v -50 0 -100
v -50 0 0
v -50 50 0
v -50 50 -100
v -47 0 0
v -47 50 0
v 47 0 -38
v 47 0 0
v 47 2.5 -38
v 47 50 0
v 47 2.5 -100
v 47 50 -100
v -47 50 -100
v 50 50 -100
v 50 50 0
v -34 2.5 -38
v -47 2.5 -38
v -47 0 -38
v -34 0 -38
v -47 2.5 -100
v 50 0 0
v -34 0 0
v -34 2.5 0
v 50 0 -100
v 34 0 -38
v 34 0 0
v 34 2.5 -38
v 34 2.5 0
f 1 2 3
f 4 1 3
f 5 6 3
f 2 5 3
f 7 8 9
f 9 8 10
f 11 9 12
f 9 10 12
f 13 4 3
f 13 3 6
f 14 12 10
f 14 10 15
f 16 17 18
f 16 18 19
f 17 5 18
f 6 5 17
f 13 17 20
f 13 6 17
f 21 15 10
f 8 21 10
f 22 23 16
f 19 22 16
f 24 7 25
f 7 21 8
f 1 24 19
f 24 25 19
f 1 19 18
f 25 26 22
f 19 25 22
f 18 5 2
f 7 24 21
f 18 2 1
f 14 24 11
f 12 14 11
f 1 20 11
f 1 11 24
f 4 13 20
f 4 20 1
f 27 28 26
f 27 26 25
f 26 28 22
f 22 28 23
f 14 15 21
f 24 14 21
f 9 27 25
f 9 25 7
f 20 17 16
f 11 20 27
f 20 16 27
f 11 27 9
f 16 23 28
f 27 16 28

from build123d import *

# Parameters (mm, degrees)
SALIENTE_EXTRUIR1_DEPTH = 100
CROQUIS2_W              = 13
CROQUIS2_H              = 38
CORTAR_EXTRUIR2_DEPTH   = 10


with BuildPart() as part:
    # Croquis1 → Saliente-Extruir1 (new body)
    with BuildSketch(Plane.XY):
        Polygon((50, 0), (-50, 0), (-50, 50), (-47, 50), (-47, 2.5), (47, 2.5), (47, 50), (50, 50), align=None)
    extrude(amount=-SALIENTE_EXTRUIR1_DEPTH)

    # Croquis2 → Cortar-Extruir2 (cut)
    with BuildSketch(Plane(origin=(0, 2.5, 0), x_dir=(1, 0, 0), z_dir=(0, 1, 0))):
        with Locations((-40.5, 19)):
            Rectangle(CROQUIS2_W, CROQUIS2_H)
        with Locations((40.5, 19)):
            Rectangle(CROQUIS2_W, CROQUIS2_H)
    extrude(amount=-CORTAR_EXTRUIR2_DEPTH, mode=Mode.SUBTRACT)


solid = part.part
